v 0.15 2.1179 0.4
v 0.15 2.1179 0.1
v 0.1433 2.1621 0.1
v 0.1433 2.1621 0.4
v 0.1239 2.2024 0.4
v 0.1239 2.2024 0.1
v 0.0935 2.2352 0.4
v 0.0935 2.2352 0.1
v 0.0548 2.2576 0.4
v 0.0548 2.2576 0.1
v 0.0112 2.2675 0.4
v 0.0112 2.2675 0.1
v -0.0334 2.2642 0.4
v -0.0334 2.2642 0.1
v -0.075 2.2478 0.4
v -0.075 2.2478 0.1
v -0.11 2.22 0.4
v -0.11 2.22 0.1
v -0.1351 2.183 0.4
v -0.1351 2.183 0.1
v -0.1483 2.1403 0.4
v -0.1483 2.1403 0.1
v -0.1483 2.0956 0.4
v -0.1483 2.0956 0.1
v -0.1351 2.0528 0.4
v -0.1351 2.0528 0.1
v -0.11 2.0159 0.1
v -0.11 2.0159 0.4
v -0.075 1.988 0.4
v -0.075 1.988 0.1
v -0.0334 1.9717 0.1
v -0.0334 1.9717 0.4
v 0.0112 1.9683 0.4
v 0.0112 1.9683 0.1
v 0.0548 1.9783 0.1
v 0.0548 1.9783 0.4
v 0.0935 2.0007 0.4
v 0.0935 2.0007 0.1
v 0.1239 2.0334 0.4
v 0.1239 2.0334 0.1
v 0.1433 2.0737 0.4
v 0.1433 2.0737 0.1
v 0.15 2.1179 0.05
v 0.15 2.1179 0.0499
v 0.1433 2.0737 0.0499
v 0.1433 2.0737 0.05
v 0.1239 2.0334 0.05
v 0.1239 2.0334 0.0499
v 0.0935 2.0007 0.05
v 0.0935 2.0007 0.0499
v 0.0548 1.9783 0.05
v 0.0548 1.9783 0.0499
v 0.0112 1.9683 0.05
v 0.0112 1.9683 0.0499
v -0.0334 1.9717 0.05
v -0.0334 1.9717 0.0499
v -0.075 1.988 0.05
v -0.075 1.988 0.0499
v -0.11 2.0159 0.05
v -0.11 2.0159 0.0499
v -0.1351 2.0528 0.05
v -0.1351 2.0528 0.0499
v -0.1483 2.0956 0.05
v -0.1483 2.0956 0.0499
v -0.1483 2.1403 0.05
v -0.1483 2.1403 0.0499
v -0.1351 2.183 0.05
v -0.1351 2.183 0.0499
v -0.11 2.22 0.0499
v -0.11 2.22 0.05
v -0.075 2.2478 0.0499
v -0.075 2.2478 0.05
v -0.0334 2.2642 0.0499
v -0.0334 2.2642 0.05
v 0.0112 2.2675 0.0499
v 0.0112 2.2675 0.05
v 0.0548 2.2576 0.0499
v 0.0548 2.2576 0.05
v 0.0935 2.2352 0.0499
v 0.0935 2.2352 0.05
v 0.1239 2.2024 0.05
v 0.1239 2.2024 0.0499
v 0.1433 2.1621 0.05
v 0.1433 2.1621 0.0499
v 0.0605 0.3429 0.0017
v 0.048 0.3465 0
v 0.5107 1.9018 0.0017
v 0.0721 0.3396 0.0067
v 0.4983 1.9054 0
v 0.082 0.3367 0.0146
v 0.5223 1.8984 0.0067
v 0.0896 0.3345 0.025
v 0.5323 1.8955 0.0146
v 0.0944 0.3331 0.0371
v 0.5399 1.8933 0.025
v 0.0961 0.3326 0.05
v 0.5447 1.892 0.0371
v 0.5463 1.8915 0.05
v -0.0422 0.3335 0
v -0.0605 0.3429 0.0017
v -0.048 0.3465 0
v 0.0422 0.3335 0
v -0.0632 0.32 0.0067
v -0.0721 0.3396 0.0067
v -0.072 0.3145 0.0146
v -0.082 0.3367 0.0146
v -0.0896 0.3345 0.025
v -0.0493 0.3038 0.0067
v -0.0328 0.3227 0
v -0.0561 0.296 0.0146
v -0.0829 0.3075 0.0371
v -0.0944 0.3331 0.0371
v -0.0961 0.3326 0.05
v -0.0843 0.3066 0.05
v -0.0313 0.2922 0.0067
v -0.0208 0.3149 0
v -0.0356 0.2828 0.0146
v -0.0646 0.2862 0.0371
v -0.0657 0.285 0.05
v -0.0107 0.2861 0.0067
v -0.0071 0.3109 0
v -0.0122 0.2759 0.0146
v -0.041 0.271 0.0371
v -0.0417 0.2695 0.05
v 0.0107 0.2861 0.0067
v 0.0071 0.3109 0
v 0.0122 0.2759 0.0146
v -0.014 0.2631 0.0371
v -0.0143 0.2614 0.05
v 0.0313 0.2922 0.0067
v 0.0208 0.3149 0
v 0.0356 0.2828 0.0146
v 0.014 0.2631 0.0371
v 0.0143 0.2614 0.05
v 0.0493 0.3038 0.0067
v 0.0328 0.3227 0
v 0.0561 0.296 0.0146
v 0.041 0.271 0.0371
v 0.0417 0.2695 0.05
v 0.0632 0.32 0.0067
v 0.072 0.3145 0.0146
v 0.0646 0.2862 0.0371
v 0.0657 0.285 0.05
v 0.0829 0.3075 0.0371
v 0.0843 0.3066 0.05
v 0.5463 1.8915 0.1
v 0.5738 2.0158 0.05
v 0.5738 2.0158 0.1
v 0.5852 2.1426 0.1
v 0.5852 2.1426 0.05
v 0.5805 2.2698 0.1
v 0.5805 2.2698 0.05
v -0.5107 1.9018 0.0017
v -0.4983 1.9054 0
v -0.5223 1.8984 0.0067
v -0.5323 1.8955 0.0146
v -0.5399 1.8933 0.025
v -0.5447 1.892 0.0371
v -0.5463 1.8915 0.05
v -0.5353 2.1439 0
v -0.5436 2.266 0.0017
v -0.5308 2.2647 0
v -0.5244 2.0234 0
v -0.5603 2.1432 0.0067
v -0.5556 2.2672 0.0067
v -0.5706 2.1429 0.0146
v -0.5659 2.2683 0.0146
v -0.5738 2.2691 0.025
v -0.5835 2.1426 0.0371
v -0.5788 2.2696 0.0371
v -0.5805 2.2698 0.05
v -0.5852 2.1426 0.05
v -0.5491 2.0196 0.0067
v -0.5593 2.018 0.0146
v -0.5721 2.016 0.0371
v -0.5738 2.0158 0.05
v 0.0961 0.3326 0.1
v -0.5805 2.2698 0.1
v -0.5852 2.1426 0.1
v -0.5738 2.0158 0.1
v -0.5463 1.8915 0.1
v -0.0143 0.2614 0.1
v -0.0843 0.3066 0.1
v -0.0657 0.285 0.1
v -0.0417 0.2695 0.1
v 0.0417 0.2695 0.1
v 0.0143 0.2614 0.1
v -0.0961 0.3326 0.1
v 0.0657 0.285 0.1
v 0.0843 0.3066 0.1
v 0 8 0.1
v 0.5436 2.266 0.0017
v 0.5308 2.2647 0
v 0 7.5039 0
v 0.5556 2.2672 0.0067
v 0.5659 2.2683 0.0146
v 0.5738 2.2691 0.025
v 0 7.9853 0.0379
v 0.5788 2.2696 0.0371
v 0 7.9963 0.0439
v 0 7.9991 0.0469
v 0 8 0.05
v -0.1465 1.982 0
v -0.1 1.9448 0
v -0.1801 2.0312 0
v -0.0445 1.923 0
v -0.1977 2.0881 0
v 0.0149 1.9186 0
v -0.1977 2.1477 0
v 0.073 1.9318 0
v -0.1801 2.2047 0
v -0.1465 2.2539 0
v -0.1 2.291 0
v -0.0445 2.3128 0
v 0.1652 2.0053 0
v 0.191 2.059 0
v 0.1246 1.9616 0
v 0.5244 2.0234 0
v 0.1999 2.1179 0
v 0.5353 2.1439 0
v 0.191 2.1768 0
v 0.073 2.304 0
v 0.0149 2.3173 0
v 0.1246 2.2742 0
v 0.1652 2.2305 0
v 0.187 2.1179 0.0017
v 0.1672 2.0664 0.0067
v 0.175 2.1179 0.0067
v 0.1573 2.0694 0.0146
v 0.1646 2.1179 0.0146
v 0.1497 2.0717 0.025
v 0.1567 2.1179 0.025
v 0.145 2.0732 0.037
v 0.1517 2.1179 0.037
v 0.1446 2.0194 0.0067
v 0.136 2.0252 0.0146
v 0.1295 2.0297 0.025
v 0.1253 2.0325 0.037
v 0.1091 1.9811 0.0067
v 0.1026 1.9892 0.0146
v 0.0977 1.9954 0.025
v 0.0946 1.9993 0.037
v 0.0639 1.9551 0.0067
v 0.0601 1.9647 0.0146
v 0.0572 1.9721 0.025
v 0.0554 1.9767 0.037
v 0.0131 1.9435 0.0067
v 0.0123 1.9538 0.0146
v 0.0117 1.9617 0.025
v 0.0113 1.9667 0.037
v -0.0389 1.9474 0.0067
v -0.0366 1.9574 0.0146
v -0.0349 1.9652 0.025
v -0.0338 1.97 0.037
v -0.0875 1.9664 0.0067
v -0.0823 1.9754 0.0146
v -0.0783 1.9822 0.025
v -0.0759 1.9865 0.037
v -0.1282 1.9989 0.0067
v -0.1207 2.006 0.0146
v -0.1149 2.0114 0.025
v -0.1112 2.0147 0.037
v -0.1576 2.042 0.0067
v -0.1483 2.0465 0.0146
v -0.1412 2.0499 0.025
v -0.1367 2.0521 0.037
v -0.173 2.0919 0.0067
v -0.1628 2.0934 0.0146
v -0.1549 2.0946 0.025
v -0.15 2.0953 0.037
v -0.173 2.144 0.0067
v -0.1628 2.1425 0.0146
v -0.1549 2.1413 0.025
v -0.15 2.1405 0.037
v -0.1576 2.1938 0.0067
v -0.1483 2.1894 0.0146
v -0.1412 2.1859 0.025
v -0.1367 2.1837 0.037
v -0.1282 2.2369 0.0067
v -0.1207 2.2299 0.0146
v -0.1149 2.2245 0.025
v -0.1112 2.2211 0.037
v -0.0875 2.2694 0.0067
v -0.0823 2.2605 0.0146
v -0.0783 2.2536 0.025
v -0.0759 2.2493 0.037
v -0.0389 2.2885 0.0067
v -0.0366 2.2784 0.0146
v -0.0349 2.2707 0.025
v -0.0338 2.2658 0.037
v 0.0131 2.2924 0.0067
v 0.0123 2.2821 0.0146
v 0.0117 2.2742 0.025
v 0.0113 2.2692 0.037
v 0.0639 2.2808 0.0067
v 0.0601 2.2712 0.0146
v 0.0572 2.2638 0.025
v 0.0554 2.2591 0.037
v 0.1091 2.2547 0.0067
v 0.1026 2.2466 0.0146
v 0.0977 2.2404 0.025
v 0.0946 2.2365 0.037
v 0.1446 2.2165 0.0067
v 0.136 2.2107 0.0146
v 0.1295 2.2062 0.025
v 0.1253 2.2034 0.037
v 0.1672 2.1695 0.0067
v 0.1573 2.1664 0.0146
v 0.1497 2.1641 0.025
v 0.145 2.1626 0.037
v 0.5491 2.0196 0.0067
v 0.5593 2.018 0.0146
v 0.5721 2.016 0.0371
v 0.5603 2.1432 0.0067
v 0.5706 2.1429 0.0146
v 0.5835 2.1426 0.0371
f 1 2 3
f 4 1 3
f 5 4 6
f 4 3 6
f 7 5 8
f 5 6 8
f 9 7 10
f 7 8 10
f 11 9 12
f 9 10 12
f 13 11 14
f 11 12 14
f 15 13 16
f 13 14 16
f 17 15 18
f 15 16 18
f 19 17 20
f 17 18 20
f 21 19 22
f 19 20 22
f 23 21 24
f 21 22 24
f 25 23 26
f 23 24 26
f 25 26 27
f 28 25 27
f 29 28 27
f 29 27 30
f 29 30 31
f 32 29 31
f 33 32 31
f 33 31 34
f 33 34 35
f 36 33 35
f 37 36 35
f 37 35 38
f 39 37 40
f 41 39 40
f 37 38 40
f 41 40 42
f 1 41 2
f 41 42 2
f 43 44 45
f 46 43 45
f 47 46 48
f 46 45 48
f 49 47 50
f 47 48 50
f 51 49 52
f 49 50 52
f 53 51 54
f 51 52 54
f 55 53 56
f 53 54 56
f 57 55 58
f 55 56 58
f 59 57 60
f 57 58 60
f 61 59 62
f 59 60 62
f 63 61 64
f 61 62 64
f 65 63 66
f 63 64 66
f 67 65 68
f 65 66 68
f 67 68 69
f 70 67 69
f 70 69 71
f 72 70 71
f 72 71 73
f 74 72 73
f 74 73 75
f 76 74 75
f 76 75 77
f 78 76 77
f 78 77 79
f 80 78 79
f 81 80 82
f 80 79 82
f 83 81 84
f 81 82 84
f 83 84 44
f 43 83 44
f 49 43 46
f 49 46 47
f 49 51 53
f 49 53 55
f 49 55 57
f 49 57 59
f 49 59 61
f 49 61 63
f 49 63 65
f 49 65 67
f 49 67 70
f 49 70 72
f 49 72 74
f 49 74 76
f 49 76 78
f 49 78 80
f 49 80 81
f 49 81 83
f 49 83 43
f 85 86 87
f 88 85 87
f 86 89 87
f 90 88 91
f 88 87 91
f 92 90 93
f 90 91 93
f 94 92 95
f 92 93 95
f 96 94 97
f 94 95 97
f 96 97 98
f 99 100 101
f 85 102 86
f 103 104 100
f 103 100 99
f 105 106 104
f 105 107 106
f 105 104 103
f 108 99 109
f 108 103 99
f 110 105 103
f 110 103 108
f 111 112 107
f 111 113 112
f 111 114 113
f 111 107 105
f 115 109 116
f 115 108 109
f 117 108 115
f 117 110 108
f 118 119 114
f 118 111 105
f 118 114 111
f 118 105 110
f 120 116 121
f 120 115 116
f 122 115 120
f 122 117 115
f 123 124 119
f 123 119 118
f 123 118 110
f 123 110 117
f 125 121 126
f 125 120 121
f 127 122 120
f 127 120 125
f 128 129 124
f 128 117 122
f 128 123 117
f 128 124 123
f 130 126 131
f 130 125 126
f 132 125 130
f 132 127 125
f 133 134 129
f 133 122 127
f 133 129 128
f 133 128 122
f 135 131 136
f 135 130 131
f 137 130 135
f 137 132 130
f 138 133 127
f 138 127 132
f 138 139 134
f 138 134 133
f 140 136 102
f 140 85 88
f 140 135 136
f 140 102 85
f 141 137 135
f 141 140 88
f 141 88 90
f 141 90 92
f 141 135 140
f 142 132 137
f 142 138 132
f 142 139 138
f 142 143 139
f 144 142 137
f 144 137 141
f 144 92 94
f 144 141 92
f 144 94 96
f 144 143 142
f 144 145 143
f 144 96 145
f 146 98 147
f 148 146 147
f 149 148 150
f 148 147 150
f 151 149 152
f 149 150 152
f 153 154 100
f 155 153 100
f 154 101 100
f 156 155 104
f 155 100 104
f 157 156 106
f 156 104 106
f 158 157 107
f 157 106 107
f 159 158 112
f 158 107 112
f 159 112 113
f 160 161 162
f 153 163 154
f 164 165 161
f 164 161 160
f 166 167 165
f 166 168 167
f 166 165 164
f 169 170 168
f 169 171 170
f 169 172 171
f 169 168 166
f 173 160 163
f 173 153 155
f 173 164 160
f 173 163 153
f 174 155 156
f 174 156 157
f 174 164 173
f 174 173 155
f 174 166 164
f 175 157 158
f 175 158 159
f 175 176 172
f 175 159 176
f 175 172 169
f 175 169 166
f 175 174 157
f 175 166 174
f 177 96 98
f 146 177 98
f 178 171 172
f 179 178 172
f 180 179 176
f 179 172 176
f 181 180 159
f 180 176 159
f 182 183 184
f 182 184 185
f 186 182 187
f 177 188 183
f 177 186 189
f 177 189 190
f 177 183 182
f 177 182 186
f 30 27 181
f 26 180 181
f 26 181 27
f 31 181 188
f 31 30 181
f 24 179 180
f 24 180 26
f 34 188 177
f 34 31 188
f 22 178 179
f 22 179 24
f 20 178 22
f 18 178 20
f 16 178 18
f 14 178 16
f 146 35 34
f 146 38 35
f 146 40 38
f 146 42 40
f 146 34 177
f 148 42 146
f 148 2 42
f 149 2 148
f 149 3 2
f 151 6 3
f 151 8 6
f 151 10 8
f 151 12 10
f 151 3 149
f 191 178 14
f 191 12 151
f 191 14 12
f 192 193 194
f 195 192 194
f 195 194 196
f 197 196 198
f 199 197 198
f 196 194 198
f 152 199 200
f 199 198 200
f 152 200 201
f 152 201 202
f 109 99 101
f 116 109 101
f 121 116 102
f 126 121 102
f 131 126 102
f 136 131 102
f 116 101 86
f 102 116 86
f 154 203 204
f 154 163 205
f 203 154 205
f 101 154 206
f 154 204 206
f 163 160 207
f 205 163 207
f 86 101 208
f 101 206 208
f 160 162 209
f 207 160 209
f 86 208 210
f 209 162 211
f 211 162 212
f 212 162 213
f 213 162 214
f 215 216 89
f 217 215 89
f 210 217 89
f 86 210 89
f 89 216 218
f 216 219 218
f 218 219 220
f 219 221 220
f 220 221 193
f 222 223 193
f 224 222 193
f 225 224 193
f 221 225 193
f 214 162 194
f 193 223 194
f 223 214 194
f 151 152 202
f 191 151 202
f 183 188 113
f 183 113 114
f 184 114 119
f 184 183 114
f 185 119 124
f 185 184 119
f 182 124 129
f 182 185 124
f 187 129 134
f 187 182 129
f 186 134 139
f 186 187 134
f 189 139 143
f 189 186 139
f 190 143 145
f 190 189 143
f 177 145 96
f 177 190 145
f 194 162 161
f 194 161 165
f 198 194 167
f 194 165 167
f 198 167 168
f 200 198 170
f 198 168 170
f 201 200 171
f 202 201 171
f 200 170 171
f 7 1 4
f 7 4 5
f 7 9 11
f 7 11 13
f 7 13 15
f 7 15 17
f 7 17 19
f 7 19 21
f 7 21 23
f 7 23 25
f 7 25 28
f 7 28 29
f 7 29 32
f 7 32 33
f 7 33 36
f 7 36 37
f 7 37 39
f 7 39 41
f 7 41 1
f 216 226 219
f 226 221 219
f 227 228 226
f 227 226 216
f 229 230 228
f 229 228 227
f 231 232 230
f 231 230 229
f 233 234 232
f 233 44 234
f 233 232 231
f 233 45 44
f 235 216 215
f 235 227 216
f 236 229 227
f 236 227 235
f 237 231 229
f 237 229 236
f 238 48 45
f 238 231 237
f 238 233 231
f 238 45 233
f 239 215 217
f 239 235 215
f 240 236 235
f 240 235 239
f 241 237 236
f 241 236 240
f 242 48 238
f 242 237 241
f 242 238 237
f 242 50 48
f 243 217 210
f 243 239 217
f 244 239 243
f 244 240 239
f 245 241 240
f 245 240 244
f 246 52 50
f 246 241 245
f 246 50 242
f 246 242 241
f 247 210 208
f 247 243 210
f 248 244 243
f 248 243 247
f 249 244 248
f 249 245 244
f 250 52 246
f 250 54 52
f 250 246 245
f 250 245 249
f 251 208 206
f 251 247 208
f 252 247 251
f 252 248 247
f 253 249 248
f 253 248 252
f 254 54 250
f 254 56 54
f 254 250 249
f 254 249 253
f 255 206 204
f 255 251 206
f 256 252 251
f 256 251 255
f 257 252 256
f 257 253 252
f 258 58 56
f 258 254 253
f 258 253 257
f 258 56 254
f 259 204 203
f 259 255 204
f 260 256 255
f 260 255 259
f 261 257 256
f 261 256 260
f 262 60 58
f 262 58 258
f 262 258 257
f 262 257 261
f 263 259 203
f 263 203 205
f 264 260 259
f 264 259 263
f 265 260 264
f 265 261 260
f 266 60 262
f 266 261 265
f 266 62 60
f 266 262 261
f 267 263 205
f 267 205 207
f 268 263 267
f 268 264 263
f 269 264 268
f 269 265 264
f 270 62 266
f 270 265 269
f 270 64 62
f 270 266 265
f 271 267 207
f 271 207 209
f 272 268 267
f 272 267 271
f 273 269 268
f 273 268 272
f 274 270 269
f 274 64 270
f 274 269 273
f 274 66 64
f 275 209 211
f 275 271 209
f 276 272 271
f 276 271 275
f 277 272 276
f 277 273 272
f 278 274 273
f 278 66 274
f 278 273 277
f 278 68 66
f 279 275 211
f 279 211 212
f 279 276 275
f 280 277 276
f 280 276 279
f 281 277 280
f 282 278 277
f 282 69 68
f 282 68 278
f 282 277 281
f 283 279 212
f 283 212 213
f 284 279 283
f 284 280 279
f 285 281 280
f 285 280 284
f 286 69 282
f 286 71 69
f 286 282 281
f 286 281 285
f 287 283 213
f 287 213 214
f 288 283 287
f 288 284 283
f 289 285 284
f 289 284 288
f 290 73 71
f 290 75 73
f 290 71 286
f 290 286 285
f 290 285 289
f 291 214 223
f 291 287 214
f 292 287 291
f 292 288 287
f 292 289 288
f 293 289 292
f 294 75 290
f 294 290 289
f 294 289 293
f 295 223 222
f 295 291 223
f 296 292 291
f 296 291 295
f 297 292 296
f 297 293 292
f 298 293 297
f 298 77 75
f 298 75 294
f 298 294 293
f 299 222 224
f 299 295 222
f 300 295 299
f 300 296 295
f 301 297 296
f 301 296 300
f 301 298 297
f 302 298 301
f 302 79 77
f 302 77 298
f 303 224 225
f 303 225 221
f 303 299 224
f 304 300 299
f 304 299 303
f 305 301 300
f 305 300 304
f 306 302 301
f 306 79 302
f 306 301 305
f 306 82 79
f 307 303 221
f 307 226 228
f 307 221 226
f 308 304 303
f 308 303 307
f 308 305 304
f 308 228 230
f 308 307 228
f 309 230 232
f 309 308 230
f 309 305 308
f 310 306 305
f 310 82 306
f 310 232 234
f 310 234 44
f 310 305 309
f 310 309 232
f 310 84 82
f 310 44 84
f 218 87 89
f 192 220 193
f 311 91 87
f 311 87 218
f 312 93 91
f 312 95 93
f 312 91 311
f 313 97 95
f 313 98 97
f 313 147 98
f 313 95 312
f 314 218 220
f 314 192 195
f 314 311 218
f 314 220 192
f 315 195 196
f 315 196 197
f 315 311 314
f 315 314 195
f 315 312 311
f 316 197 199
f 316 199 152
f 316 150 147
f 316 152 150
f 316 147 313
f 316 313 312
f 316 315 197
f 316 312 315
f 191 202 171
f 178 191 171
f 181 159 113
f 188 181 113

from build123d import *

# Parameters (mm, degrees)
EXTRUDE_1_DEPTH     = 0.1
SKETCH_2_R          = 0.15
EXTRUDE_2_DEPTH     = 0.3
FILLET_1_R          = 0.1
FILLET_3_R          = 0.05
SKETCH_3_R          = 0.15
CUT_EXTRUDE_1_DEPTH = 0.05
FILLET_4_R          = 0.05


with BuildPart() as part:
    # Эскиз1 → Бобышка-Вытянуть1 (new body)
    with BuildSketch(Plane.XY):
        with BuildLine():
            Line((0, 8), (-0.580504166, 2.26976061))
            ThreePointArc((-0.580504166, 2.26976061), (-0.58153919, 2.078982478), (-0.546324519, 1.891479695))
            Line((-0.546324519, 1.891479695), (0, 0))
            Line((0, 0), (0.546324519, 1.891479695))
            ThreePointArc((0.546324519, 1.891479695), (0.58153919, 2.078982478), (0.580504166, 2.26976061))
            Line((0.580504166, 2.26976061), (0, 8))
        make_face()
    extrude(amount=EXTRUDE_1_DEPTH)

    # Эскиз2 → Бобышка-Вытянуть2 (add)
    with BuildSketch(Plane.XY.offset(0.1)):
        with Locations((0, 2.117926147)):
            Circle(SKETCH_2_R)
    extrude(amount=EXTRUDE_2_DEPTH)

    # Скругление1
    fillet_1_edges = [part.edges().sort_by_distance(p)[0] for p in [
        (0, 0, 0.05),
    ]]
    fillet(fillet_1_edges, radius=FILLET_1_R)

    # Скругление3
    fillet_3_edges = [part.edges().sort_by_distance(p)[0] for p in [
        (0.321198666, 1.112051048, 0),
        (0, 0.260371541, 0),
        (-0.321198666, 1.112051048, 0),
        (-0.58153919, 2.078982478, 0),
        (-0.290252083, 5.134880305, 0),
        (0.290252083, 5.134880305, 0),
        (0.58153919, 2.078982478, 0),
    ]]
    fillet(fillet_3_edges, radius=FILLET_3_R)

    # Эскиз3 → Вырез-Вытянуть1 (cut)
    with BuildSketch(Plane(origin=(0, 0, 0), x_dir=(-1, 0, 0), z_dir=(0, 0, -1))):
        with Locations(Location((0, 2.117926147, 0), (0, 0, 180))):
            Circle(SKETCH_3_R)
    extrude(amount=-CUT_EXTRUDE_1_DEPTH, mode=Mode.SUBTRACT)

    # Скругление4
    fillet_4_edges = [part.edges().sort_by_distance(p)[0] for p in [
        (-0.15, 2.117926147, 0),
    ]]
    fillet(fillet_4_edges, radius=FILLET_4_R - 0.0001)  # a hair under: the kernel refuses the full size


solid = part.part
